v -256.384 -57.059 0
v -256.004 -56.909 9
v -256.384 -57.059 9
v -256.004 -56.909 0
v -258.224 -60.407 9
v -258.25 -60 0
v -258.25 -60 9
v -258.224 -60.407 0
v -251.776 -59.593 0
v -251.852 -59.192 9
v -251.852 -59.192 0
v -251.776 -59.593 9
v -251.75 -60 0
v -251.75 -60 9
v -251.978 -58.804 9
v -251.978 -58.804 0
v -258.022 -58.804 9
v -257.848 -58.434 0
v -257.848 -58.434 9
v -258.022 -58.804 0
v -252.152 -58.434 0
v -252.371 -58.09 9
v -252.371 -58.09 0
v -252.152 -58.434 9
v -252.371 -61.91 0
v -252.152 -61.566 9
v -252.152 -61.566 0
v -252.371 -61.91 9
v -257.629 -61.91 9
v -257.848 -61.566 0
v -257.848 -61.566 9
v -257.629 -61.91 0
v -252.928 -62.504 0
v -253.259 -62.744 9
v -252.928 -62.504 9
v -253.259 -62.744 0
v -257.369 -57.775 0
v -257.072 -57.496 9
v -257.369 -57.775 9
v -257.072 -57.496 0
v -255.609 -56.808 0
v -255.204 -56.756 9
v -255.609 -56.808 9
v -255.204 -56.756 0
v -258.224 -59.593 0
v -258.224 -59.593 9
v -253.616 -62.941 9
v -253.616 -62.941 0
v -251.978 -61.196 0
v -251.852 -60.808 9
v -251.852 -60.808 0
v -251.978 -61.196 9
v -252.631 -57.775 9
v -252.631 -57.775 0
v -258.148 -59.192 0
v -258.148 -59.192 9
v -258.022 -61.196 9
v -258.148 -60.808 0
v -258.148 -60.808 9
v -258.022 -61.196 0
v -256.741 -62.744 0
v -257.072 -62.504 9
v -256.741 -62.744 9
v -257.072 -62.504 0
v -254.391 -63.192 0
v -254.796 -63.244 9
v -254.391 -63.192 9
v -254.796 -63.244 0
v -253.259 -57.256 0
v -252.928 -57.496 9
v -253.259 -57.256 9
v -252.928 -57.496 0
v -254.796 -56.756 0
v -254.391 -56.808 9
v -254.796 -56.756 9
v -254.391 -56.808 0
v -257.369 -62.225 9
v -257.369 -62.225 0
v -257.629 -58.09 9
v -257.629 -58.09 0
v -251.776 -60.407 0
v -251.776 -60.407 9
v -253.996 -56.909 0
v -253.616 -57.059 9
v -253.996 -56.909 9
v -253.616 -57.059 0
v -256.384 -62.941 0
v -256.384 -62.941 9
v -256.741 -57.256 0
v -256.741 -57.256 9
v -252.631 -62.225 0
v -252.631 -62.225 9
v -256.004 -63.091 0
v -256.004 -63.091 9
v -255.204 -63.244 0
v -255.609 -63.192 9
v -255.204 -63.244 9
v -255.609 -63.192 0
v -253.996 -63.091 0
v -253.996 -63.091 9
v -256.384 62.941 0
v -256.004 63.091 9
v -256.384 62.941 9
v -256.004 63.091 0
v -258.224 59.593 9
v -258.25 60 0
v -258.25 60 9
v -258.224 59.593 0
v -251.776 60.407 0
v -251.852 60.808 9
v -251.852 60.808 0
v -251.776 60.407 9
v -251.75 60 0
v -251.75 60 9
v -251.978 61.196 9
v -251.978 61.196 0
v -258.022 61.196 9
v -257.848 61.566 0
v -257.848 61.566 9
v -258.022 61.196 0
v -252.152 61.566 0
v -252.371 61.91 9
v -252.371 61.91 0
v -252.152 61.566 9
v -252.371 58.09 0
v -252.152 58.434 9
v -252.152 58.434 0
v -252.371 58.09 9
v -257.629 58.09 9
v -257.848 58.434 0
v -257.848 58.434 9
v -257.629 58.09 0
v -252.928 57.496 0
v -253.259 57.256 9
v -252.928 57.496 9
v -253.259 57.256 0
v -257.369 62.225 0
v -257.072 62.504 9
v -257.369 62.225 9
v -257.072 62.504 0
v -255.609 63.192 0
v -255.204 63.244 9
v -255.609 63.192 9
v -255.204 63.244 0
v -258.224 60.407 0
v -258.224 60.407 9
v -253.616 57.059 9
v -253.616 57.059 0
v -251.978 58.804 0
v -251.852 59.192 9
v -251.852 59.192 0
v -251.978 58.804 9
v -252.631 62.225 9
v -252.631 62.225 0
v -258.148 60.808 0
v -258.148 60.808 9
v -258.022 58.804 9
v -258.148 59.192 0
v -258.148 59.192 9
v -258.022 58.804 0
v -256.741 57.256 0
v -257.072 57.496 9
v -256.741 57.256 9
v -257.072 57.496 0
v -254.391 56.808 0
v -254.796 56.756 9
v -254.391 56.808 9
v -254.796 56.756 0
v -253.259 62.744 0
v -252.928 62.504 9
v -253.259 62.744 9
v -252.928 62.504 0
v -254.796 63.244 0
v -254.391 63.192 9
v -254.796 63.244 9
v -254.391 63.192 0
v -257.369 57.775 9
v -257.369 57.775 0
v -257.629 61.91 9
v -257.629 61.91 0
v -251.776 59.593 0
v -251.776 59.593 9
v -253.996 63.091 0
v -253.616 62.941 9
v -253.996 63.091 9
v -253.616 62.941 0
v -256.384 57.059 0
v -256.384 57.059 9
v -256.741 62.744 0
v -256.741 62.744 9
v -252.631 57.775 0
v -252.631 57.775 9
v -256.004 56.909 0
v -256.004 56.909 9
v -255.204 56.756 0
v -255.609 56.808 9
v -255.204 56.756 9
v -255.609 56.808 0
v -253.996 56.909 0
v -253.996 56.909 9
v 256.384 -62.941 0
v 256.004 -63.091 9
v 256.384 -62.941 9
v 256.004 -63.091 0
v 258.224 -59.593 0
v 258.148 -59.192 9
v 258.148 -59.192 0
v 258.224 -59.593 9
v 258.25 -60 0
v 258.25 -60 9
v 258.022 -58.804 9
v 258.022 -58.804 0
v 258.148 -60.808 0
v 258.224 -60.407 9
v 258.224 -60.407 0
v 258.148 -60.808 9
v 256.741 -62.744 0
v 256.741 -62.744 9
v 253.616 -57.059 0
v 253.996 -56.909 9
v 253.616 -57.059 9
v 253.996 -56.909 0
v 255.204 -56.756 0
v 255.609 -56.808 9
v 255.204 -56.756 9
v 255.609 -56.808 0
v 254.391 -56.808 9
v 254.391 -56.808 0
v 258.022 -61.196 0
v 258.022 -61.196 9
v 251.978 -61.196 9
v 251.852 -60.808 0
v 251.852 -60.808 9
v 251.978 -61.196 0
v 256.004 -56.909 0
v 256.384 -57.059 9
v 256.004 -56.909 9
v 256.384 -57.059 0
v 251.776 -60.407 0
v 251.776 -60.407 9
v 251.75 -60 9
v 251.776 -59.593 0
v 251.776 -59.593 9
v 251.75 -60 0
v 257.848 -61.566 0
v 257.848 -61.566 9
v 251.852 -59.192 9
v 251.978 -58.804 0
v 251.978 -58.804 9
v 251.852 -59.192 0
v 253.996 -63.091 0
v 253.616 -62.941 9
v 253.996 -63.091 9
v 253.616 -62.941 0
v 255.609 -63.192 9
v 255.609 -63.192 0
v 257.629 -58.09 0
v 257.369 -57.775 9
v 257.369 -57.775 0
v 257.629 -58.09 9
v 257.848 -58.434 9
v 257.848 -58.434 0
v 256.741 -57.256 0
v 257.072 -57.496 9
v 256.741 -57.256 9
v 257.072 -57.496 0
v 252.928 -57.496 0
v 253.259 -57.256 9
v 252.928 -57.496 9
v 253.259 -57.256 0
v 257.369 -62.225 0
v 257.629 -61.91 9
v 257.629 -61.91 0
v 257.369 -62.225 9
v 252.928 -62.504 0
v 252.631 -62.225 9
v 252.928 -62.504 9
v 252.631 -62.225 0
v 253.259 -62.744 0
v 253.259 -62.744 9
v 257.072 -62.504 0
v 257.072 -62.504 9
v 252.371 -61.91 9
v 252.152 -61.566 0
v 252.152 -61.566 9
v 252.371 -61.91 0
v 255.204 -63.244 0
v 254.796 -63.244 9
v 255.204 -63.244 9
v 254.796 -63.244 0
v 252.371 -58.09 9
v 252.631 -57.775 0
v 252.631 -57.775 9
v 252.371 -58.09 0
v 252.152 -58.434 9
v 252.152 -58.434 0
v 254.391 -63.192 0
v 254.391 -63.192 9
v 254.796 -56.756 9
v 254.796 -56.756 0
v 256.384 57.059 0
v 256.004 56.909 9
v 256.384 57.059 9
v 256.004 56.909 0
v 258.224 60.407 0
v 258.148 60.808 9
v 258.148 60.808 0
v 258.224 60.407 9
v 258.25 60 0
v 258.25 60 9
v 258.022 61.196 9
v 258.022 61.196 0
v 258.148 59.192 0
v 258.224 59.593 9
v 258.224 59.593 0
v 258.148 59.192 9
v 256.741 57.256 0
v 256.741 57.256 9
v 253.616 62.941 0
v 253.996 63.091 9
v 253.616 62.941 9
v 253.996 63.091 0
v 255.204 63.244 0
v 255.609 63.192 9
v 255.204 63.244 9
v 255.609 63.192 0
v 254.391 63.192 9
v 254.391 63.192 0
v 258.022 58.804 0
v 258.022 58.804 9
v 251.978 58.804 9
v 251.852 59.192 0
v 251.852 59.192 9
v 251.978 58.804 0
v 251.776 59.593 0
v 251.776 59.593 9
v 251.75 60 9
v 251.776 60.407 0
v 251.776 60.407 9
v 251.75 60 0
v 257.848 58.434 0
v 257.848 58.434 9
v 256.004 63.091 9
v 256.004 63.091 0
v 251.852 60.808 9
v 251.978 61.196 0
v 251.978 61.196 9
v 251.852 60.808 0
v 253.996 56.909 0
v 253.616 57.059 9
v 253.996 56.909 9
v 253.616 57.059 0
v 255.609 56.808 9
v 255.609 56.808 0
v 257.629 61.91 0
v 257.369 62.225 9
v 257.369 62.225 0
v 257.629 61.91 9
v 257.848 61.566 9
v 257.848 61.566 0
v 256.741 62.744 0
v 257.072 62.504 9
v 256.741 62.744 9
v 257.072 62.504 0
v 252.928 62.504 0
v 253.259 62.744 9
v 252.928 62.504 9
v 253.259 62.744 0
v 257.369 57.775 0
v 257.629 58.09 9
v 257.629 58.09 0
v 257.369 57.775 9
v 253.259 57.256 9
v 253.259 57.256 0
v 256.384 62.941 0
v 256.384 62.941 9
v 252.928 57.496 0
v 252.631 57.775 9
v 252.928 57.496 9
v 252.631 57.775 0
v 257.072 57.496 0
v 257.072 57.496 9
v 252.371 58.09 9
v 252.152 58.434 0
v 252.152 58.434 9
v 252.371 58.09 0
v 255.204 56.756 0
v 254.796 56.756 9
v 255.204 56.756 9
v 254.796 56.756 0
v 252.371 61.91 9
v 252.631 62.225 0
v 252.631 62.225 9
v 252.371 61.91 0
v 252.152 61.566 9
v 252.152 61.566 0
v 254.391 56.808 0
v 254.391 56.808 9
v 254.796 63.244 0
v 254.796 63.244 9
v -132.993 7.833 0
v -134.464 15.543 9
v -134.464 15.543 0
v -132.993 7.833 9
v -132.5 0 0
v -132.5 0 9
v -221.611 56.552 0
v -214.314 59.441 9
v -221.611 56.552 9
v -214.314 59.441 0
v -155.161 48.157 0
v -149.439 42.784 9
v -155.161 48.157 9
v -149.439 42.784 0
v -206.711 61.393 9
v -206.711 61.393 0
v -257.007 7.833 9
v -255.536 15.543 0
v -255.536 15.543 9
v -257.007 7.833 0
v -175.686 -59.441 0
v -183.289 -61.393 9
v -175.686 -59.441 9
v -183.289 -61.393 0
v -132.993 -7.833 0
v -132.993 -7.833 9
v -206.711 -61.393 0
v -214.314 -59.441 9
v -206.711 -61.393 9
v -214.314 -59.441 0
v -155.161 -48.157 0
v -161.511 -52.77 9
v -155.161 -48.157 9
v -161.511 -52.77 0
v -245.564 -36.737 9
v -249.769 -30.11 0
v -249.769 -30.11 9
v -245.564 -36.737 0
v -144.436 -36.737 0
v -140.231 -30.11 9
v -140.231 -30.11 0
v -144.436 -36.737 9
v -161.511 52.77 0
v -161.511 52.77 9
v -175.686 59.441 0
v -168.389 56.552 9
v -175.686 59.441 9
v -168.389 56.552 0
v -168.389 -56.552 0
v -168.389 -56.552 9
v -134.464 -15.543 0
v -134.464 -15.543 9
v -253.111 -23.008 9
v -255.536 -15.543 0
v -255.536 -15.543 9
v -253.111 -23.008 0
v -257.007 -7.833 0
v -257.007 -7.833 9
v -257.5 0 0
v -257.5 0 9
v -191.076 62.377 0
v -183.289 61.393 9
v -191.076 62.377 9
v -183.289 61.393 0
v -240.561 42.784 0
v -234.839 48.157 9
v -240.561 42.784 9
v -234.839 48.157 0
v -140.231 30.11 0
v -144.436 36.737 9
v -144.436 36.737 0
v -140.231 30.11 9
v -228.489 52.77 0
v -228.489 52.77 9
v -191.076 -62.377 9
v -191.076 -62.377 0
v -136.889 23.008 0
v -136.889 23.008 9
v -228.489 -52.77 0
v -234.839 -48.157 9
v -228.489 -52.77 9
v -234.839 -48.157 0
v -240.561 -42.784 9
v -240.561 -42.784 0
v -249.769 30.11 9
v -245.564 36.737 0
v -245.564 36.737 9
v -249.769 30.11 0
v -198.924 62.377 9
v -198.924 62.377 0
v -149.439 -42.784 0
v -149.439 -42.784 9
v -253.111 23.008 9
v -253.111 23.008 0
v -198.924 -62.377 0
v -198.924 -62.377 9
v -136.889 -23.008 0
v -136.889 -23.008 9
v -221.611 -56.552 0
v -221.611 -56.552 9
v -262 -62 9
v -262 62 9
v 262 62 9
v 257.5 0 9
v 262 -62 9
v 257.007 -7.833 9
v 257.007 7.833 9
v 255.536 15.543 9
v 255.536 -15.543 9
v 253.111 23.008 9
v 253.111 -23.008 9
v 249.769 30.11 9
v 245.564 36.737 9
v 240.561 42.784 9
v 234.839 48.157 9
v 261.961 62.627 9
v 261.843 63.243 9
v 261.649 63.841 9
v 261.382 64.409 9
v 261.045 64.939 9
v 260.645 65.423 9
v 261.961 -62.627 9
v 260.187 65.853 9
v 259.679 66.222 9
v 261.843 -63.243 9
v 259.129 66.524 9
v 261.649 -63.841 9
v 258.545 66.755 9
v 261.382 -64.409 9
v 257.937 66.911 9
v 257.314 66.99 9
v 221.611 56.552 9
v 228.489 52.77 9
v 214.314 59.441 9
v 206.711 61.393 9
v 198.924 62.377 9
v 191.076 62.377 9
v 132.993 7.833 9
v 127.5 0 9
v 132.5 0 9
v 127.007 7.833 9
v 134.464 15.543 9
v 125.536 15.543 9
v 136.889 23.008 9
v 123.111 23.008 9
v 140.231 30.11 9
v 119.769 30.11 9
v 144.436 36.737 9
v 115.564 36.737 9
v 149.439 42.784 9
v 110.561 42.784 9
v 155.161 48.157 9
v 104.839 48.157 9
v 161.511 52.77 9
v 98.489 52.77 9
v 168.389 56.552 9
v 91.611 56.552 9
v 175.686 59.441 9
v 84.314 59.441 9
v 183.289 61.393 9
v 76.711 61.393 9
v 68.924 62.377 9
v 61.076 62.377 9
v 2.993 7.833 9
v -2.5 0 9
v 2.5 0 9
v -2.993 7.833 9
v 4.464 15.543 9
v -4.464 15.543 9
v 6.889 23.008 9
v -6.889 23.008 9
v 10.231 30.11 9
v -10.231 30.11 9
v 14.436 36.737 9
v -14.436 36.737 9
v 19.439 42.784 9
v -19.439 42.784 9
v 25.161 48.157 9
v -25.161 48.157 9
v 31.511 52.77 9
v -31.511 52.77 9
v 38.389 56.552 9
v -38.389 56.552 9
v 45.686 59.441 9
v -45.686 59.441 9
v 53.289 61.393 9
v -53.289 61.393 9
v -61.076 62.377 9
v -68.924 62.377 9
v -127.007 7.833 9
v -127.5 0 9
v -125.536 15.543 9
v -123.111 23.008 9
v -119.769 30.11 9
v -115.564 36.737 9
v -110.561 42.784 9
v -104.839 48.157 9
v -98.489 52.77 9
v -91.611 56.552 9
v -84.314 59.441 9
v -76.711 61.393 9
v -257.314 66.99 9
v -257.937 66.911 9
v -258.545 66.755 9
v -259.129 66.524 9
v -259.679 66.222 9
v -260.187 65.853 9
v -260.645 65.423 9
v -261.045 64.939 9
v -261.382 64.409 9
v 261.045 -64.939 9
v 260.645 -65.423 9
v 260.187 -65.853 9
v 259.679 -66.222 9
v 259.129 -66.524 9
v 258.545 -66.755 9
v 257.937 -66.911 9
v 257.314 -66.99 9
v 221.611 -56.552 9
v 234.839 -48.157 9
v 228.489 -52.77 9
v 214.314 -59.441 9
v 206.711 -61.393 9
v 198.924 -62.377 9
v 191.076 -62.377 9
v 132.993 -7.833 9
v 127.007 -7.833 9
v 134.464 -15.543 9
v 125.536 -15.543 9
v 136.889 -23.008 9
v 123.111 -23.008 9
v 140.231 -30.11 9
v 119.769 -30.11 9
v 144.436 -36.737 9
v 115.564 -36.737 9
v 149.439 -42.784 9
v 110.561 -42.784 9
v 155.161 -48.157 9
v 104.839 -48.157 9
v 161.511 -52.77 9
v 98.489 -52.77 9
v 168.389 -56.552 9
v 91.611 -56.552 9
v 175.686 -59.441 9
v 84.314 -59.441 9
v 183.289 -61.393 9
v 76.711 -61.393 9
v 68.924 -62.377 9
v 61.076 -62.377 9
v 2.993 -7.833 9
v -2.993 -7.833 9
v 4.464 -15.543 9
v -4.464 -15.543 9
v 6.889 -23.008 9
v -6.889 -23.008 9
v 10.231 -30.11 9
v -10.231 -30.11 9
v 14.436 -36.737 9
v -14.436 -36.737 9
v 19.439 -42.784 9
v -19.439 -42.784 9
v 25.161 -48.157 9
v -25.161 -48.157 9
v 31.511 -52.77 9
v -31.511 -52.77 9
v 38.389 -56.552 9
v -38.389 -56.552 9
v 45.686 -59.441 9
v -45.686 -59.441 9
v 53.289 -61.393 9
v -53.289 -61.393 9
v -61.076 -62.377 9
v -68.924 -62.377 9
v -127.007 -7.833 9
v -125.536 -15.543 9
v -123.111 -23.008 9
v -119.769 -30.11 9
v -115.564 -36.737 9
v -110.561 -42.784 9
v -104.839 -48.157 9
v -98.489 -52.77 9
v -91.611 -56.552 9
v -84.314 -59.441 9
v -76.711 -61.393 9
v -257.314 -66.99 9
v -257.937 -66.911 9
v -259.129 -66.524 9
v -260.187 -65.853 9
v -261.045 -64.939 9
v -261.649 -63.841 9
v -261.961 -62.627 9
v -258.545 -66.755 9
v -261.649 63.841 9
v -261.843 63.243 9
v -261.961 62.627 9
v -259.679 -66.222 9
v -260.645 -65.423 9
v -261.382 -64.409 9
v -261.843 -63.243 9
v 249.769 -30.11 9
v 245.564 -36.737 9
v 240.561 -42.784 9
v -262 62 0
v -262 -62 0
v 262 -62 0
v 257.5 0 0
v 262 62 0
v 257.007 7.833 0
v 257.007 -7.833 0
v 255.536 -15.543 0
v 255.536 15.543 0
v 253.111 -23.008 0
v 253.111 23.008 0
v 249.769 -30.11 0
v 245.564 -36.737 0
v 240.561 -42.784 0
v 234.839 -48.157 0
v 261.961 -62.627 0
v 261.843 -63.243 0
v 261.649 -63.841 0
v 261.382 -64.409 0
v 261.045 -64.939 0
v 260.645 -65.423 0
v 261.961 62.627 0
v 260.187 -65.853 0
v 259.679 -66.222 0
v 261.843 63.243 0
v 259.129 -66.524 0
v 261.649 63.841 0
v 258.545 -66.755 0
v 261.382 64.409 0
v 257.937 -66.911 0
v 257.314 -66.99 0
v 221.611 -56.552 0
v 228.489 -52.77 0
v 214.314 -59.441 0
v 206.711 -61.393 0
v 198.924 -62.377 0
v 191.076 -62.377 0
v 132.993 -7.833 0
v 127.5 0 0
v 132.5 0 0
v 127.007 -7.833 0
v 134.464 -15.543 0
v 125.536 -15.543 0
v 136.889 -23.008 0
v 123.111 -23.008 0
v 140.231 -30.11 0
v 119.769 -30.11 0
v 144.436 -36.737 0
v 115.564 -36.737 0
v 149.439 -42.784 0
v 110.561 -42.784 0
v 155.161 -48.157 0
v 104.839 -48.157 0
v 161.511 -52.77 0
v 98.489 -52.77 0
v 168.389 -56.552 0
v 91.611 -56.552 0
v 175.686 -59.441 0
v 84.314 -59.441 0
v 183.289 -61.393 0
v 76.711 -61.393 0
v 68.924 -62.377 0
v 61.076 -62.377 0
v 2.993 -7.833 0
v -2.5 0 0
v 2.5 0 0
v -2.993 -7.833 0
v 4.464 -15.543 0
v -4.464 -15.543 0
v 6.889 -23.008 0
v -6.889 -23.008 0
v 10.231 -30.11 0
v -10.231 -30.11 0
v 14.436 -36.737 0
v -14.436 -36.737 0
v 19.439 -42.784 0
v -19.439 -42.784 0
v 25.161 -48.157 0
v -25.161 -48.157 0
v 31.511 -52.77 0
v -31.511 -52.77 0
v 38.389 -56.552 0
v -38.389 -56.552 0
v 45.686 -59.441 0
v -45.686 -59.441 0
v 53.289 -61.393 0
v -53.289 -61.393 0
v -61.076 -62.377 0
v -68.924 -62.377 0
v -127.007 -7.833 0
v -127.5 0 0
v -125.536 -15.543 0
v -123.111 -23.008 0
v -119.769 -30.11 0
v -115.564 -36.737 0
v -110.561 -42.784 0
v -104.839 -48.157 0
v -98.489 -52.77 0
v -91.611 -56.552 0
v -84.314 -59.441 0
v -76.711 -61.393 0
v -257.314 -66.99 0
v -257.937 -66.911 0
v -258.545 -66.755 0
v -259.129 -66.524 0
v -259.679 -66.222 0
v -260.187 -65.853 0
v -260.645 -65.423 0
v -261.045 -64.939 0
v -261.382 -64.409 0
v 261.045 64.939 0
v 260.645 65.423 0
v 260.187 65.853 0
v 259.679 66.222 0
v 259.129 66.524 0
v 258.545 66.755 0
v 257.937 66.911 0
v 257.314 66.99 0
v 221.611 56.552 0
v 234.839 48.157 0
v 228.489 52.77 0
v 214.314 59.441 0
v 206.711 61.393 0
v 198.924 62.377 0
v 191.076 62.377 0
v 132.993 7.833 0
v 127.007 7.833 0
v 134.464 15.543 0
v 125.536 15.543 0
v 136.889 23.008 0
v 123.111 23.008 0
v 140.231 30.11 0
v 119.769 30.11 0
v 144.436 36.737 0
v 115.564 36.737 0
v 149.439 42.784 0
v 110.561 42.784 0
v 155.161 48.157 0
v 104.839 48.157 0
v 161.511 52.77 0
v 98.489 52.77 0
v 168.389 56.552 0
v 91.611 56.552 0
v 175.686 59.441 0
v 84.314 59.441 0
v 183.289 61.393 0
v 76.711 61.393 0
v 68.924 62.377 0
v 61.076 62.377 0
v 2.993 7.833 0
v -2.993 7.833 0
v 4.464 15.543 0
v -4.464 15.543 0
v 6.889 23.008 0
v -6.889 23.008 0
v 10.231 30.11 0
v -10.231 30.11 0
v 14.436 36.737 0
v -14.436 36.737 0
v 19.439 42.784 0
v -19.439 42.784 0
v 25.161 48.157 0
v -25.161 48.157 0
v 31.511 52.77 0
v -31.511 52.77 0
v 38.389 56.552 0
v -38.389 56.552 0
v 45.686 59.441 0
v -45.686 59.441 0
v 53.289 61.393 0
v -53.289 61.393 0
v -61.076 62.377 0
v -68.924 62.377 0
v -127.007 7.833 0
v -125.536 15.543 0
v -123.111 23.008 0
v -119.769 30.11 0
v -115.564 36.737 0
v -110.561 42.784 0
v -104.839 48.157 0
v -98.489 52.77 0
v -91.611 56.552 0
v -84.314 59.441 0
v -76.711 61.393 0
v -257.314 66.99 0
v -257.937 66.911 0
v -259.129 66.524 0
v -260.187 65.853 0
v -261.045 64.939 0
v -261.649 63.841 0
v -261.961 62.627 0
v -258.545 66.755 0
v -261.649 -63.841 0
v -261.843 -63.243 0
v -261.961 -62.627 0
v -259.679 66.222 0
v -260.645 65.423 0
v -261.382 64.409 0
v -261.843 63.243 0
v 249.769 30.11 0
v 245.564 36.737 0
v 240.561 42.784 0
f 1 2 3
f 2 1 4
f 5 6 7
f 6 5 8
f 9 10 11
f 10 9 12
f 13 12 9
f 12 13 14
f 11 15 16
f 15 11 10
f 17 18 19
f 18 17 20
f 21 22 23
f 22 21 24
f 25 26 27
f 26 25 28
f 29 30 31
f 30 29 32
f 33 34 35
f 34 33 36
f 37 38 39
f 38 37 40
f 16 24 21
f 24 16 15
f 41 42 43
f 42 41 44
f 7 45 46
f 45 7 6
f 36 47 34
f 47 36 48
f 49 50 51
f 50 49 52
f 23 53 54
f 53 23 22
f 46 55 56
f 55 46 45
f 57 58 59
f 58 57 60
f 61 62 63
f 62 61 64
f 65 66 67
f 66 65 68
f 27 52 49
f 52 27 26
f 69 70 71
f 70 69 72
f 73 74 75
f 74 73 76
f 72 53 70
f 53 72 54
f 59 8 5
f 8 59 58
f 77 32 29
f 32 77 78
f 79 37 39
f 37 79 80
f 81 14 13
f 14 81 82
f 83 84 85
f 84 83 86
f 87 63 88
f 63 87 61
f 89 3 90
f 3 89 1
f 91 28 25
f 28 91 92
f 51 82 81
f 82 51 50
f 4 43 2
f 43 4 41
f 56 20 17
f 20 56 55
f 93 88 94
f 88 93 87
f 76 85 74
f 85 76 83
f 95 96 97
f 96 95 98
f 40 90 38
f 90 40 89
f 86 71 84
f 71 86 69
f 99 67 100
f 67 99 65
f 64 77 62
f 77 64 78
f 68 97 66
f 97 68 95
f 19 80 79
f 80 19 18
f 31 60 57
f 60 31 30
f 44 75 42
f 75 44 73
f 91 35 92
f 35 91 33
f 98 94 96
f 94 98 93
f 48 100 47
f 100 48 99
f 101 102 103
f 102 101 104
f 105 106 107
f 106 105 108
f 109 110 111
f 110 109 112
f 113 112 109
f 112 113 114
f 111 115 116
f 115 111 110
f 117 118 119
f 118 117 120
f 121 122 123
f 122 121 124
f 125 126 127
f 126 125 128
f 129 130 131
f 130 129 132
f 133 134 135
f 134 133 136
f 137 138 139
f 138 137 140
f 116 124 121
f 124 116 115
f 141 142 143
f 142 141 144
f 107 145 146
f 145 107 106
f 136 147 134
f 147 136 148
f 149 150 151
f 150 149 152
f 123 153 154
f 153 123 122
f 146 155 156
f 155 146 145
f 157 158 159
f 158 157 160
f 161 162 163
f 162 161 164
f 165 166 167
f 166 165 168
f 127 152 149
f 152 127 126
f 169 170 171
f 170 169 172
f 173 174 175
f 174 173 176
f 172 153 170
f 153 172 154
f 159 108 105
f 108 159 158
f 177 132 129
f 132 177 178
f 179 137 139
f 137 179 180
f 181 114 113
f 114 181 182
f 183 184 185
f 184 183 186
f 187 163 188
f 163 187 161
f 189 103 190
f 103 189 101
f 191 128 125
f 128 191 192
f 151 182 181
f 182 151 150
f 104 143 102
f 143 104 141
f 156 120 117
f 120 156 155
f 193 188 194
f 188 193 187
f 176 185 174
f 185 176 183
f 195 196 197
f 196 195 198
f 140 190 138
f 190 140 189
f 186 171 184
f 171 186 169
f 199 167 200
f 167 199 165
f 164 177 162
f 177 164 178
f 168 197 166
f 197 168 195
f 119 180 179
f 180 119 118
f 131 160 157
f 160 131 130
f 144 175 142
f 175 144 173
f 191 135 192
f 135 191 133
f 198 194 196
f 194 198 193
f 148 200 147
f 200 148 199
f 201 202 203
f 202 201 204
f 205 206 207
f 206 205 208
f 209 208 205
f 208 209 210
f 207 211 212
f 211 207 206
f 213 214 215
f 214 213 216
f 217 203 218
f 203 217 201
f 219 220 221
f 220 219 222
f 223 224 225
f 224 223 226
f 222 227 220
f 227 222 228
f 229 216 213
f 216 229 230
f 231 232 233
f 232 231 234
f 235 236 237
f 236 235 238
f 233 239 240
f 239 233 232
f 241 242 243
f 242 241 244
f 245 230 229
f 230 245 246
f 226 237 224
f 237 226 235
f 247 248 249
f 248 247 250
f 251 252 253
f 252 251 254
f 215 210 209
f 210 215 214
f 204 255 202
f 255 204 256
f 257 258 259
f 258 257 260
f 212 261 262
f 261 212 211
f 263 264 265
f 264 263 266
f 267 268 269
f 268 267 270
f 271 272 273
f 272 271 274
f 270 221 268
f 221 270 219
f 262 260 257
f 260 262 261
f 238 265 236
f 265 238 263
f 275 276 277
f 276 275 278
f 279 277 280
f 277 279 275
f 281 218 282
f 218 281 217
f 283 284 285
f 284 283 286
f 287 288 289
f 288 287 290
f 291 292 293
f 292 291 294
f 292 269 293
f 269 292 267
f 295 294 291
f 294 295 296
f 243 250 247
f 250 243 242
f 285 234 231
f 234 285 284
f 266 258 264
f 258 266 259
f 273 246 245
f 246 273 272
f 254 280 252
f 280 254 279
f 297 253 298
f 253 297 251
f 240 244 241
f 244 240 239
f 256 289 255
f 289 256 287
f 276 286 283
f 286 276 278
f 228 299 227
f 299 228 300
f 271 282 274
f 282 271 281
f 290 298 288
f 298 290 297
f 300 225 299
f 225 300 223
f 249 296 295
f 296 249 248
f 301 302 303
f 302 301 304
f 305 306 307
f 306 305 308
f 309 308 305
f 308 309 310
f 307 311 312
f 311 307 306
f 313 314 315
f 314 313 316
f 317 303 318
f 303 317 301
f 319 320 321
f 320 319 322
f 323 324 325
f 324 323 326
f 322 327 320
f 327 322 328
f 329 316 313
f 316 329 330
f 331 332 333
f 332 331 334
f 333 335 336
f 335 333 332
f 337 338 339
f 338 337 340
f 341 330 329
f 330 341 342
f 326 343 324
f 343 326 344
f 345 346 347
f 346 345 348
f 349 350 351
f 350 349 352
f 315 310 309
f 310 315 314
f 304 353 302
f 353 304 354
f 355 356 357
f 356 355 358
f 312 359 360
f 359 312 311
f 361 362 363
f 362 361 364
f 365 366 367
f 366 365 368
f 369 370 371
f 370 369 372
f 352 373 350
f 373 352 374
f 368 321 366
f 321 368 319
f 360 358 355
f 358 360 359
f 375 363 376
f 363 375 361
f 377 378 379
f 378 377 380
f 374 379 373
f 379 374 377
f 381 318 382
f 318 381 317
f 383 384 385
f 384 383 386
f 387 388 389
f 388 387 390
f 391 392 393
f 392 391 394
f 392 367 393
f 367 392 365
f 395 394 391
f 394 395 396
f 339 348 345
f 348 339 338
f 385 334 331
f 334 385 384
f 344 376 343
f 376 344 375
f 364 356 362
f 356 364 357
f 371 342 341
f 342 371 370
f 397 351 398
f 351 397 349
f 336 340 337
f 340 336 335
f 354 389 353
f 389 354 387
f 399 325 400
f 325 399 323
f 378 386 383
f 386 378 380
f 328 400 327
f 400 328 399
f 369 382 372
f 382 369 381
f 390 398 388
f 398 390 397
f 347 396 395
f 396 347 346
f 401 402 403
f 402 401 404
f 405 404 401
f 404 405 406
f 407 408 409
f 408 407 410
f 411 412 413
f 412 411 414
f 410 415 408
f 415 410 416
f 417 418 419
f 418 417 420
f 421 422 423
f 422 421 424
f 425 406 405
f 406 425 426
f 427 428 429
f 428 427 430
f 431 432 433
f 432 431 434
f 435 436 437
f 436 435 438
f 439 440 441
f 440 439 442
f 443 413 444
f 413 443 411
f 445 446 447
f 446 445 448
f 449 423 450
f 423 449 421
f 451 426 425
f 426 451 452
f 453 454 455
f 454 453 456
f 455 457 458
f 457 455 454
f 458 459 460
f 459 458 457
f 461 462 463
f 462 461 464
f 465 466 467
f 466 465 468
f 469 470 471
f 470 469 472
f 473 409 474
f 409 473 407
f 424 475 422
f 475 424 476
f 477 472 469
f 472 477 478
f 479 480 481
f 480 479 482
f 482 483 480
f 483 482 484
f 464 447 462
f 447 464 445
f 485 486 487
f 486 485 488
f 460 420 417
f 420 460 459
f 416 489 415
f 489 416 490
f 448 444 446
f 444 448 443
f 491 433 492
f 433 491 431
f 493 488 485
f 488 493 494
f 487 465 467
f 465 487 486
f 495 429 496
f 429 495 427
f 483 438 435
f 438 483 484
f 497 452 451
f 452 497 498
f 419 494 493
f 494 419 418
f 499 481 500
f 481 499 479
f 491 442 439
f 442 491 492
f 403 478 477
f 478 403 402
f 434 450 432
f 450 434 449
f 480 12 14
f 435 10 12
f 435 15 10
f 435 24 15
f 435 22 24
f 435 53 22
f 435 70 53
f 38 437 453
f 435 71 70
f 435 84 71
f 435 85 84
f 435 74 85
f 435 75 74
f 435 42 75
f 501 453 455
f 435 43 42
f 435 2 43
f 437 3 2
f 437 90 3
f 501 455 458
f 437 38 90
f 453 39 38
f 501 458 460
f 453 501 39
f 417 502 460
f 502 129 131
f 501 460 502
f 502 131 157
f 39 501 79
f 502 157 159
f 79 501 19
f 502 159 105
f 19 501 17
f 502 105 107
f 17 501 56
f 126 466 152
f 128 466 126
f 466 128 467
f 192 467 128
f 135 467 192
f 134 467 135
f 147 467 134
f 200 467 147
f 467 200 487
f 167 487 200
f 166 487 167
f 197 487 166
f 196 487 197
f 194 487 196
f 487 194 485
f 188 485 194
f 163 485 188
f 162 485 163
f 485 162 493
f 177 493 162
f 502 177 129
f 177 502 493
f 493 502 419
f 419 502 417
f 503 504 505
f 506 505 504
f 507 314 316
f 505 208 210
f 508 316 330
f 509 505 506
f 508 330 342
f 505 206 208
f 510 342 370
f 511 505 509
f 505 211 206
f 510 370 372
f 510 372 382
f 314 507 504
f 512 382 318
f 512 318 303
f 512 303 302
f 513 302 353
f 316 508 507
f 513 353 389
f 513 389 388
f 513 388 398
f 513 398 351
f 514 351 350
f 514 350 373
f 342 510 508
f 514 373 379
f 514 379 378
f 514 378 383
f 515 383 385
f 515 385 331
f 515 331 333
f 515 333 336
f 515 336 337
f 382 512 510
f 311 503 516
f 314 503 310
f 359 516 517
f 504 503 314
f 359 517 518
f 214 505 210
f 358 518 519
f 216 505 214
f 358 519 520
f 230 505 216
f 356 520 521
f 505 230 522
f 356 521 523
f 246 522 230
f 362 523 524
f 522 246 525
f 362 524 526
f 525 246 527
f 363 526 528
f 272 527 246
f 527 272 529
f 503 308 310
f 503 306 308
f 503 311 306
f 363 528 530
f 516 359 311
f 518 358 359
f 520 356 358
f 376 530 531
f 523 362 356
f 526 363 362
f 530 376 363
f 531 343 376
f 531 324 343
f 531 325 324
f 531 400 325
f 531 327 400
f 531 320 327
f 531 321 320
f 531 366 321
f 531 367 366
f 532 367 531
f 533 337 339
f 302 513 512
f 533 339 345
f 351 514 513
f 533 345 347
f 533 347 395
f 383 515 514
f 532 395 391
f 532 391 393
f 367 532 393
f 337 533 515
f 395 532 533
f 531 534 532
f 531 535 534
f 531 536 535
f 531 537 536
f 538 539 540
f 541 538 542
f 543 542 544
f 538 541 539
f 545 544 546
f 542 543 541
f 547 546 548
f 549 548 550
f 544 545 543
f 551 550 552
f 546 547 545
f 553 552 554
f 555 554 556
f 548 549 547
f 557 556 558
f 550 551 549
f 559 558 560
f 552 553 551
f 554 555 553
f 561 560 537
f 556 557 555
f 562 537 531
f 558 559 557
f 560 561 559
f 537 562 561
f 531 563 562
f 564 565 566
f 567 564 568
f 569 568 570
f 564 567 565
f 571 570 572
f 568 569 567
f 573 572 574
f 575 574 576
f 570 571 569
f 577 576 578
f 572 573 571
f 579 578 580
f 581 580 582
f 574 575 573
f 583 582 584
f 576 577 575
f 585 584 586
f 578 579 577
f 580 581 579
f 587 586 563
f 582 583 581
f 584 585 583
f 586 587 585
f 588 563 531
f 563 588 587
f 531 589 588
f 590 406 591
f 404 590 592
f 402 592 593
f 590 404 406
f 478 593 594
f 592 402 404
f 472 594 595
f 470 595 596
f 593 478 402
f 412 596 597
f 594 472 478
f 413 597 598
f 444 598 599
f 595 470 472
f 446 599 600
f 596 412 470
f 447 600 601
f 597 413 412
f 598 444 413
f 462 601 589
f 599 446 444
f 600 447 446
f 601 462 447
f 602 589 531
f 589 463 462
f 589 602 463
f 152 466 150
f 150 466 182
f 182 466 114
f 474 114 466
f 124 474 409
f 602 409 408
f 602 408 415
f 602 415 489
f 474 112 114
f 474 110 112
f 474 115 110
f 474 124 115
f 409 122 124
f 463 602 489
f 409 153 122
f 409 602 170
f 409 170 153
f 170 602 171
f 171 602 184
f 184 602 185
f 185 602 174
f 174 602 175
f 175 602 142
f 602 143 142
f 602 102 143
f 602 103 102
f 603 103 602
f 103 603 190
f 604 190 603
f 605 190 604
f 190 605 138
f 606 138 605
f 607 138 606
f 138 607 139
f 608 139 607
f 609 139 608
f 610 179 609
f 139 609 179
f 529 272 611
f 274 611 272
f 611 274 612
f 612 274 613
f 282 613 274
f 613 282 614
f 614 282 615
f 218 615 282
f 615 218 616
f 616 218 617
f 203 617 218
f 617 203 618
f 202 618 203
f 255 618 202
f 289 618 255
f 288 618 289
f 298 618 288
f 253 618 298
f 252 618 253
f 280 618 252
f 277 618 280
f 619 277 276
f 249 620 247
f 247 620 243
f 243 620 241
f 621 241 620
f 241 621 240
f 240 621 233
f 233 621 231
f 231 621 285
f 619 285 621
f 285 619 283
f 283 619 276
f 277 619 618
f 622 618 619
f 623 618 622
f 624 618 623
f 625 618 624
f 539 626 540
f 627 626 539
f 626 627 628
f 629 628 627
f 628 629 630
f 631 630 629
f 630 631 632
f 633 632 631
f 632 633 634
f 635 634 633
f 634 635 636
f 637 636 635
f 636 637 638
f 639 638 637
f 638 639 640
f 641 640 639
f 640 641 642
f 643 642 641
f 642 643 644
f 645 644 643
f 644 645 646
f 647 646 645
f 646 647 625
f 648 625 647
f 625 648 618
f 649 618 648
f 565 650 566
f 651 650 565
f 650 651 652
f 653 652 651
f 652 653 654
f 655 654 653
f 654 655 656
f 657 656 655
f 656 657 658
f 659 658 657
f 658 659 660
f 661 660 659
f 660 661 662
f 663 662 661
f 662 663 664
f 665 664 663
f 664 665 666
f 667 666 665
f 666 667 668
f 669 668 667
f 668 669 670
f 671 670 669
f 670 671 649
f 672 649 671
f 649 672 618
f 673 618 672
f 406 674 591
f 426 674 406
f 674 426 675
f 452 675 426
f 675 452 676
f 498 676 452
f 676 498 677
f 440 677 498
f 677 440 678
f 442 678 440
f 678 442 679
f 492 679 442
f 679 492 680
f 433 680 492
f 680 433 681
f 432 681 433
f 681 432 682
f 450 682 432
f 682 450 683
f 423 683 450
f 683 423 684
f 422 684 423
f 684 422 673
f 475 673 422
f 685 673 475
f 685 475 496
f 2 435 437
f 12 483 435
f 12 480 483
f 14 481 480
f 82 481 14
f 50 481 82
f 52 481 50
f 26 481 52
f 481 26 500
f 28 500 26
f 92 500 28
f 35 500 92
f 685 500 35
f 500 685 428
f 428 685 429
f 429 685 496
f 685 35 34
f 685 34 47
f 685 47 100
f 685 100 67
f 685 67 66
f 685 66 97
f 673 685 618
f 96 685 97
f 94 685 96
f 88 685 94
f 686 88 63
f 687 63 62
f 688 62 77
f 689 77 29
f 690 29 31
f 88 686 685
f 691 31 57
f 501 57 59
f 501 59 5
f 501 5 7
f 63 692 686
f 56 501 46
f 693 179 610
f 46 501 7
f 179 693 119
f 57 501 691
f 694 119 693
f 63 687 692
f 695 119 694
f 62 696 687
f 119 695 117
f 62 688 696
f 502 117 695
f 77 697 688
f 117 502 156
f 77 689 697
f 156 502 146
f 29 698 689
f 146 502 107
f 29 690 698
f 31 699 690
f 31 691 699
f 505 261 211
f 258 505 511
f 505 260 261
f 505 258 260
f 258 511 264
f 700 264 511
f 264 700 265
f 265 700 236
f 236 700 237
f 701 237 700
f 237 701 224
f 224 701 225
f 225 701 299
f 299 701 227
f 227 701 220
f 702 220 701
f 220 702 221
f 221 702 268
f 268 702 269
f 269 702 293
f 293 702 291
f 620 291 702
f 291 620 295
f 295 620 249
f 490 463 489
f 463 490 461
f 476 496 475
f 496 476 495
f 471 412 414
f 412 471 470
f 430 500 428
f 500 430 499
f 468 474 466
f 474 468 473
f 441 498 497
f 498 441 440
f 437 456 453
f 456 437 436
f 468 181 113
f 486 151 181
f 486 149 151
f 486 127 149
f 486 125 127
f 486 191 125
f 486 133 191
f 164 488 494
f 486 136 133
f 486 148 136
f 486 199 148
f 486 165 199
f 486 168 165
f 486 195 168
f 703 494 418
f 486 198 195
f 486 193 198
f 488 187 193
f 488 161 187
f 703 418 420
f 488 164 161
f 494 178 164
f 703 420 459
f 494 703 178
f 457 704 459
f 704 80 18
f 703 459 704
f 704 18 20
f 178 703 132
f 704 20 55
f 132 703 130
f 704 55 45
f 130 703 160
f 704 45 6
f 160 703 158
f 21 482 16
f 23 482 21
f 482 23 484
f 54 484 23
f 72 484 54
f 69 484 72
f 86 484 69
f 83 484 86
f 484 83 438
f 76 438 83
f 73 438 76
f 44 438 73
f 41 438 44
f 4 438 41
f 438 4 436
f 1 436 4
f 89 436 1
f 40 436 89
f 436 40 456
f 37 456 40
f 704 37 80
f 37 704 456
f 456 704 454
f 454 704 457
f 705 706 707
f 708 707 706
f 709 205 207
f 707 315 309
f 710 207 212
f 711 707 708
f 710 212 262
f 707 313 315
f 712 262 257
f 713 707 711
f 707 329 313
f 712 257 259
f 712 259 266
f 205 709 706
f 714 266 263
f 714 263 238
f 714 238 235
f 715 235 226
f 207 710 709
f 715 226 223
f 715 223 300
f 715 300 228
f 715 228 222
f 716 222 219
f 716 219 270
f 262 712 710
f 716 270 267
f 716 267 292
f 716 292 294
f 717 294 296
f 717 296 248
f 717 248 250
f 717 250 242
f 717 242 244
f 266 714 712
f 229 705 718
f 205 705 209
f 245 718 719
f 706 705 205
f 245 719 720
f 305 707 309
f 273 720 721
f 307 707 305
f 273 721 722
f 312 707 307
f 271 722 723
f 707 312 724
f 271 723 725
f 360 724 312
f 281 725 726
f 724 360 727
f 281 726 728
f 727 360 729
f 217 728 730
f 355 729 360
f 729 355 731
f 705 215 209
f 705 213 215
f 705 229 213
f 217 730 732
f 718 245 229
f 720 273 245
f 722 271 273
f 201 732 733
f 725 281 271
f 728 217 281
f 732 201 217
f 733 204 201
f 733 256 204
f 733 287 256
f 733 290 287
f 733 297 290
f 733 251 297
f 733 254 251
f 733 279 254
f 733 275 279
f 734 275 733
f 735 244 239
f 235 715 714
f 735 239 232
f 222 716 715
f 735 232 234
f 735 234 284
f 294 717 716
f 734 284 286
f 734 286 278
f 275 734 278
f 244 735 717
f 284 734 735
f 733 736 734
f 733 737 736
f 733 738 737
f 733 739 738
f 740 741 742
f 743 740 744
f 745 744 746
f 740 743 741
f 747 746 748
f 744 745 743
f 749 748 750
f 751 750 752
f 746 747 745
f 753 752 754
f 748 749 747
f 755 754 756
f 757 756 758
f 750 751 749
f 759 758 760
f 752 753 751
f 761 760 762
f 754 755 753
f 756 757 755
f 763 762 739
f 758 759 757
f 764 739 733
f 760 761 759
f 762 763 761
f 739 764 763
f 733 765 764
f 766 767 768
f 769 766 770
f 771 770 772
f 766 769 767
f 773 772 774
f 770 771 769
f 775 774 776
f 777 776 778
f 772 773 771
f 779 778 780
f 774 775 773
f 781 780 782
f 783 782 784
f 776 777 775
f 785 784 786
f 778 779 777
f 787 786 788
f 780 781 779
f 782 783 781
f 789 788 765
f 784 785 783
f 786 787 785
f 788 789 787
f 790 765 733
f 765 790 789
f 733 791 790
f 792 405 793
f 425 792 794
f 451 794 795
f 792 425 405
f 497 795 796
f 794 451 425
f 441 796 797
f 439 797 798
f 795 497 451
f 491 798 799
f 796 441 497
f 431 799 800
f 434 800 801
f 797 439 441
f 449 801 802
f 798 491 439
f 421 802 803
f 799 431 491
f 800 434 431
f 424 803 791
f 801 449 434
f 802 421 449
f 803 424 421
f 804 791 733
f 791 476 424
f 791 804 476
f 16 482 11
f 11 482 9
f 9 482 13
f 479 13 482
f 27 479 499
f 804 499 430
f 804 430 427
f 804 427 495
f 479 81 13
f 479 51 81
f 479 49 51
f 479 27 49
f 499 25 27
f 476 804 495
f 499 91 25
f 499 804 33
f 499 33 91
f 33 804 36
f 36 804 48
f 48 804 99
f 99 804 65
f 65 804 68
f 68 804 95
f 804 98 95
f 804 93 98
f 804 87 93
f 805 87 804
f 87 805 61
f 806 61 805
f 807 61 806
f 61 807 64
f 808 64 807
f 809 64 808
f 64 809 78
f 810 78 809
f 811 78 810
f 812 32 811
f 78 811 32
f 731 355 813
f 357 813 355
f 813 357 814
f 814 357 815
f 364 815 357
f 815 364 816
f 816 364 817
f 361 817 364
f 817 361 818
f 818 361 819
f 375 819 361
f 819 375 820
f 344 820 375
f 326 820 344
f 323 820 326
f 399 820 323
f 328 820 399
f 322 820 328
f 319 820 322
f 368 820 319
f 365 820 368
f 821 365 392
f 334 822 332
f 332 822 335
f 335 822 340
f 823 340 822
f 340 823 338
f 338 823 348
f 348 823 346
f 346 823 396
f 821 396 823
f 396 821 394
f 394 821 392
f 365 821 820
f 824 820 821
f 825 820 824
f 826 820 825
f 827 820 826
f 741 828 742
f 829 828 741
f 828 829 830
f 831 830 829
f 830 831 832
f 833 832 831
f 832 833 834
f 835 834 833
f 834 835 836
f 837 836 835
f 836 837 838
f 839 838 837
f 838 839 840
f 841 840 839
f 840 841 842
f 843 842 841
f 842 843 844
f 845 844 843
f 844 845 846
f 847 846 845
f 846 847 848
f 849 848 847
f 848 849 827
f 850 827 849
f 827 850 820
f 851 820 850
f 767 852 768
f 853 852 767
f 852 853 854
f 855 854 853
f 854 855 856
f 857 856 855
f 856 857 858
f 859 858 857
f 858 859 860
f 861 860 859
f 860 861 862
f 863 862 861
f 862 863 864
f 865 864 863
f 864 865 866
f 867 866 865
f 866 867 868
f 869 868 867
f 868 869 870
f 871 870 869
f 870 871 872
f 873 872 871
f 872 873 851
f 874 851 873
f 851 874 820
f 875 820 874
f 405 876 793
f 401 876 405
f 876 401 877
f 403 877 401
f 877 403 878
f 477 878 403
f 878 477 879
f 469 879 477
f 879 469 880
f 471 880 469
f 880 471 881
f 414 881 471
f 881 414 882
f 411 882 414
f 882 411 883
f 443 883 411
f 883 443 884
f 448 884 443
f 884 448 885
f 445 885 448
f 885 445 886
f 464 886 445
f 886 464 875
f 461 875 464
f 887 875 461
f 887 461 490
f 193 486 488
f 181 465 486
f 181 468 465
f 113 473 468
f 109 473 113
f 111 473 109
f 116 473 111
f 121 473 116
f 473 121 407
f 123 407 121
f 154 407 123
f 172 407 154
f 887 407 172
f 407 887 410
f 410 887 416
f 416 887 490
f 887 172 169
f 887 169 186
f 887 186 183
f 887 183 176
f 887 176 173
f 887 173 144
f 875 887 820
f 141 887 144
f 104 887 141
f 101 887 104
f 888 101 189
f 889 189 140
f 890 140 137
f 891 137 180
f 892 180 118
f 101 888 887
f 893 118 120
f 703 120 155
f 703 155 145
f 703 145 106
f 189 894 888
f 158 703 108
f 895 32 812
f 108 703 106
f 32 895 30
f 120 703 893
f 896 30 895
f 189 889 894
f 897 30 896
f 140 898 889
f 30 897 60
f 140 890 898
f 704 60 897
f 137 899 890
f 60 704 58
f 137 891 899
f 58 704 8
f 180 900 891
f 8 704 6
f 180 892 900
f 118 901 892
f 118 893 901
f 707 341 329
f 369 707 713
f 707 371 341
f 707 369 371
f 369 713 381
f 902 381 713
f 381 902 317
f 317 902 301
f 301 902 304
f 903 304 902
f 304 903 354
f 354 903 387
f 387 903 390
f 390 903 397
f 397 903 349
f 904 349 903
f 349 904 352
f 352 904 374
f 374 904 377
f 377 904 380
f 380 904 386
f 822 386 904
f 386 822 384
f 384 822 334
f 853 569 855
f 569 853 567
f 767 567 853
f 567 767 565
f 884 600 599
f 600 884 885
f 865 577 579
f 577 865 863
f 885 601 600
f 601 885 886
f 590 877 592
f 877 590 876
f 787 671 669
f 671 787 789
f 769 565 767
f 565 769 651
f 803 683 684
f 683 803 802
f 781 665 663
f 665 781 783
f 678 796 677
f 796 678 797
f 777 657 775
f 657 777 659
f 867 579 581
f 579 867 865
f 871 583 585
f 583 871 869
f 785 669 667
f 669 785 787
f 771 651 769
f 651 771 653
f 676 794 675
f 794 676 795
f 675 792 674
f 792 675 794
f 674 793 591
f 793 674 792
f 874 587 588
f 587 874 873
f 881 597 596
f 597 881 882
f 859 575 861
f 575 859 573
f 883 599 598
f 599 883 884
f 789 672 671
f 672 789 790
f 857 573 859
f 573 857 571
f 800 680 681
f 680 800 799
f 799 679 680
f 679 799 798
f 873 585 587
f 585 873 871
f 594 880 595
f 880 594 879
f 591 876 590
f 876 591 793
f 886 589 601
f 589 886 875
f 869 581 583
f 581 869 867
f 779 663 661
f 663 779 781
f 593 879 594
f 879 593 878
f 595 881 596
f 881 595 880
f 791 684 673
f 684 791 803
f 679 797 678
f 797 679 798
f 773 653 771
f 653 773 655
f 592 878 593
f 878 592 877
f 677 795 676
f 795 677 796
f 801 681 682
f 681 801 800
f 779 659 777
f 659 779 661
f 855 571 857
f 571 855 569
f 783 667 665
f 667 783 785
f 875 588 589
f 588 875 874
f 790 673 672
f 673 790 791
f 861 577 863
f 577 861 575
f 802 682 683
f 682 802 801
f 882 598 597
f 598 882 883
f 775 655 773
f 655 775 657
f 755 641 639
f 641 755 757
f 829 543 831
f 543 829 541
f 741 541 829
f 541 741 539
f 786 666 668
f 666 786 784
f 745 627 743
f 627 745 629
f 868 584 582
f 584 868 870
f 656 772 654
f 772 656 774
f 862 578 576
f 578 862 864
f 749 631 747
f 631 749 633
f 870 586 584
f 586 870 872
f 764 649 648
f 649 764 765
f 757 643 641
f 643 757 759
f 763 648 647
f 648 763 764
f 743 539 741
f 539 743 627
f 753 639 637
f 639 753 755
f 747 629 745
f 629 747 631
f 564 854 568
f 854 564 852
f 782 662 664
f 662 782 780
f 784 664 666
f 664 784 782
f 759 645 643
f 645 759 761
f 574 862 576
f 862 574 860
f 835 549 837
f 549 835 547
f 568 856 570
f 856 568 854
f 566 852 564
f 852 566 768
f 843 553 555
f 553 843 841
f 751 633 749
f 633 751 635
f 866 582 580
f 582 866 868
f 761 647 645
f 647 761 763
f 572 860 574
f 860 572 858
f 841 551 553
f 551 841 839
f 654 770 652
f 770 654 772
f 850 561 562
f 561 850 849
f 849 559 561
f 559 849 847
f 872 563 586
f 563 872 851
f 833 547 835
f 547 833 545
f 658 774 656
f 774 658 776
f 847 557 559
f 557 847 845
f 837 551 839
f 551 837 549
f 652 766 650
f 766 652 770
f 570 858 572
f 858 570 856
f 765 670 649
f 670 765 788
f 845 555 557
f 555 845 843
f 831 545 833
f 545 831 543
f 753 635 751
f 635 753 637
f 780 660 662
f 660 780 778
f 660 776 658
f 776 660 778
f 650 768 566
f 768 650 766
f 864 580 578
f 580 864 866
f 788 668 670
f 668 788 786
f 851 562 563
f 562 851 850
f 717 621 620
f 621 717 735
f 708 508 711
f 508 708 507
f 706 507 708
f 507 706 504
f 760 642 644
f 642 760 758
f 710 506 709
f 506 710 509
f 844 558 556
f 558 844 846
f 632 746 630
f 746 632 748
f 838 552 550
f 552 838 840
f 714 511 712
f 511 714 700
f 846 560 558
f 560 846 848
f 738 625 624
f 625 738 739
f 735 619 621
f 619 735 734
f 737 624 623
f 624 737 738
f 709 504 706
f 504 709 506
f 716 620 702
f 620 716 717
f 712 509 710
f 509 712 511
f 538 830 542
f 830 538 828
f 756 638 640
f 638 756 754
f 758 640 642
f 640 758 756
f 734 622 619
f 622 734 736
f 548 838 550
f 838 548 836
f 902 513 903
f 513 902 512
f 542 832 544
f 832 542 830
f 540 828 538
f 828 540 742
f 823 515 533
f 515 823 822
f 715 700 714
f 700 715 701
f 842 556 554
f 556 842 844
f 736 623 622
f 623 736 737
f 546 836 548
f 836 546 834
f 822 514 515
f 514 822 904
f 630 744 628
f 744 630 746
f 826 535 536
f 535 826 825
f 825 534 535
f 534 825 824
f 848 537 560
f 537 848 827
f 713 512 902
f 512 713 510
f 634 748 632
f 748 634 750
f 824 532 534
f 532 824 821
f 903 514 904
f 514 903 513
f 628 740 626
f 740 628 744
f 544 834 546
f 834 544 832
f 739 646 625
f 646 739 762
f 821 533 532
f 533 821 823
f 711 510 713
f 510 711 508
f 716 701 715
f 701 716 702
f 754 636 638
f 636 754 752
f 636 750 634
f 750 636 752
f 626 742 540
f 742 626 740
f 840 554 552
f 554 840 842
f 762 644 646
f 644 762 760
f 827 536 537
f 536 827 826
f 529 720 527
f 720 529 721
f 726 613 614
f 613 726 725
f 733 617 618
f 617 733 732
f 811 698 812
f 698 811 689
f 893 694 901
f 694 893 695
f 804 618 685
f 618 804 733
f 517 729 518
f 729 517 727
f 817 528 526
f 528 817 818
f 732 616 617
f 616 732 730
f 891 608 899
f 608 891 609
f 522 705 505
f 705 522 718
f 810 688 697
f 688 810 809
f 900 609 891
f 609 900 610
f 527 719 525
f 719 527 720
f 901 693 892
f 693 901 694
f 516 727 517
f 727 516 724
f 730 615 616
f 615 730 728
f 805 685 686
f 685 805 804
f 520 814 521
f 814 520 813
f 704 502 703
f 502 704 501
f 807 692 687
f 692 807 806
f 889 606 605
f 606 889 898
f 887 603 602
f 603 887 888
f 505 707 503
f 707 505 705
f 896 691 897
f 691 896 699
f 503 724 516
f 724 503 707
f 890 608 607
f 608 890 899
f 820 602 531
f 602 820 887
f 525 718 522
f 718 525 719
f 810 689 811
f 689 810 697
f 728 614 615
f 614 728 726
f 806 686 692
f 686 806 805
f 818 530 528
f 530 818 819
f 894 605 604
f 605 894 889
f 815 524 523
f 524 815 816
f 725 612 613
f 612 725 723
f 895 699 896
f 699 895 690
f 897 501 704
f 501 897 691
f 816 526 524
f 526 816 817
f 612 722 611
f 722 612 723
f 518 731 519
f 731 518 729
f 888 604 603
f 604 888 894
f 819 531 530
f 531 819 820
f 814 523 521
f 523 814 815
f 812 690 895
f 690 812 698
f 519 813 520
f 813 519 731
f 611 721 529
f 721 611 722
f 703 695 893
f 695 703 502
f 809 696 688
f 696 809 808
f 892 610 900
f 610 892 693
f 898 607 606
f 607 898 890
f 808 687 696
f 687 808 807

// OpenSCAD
$fn = 50;


difference() {
	union() {
		hull() {
			translate(v = [-257.0000000000, 62.0000000000, 0]) {
				cylinder(h = 9, r = 5);
			}
			translate(v = [257.0000000000, 62.0000000000, 0]) {
				cylinder(h = 9, r = 5);
			}
			translate(v = [-257.0000000000, -62.0000000000, 0]) {
				cylinder(h = 9, r = 5);
			}
			translate(v = [257.0000000000, -62.0000000000, 0]) {
				cylinder(h = 9, r = 5);
			}
		}
	}
	union() {
		#translate(v = [-255.0000000000, -60.0000000000, -100.0000000000]) {
			cylinder(h = 200, r = 3.2500000000);
		}
		#translate(v = [-255.0000000000, 60.0000000000, -100.0000000000]) {
			cylinder(h = 200, r = 3.2500000000);
		}
		#translate(v = [255.0000000000, -60.0000000000, -100.0000000000]) {
			cylinder(h = 200, r = 3.2500000000);
		}
		#translate(v = [255.0000000000, 60.0000000000, -100.0000000000]) {
			cylinder(h = 200, r = 3.2500000000);
		}
		#translate(v = [-195.0000000000, 0, 0]) {
			cylinder(h = 9, r = 62.5000000000);
		}
		#translate(v = [-65.0000000000, 0, 0]) {
			cylinder(h = 9, r = 62.5000000000);
		}
		#translate(v = [65.0000000000, 0, 0]) {
			cylinder(h = 9, r = 62.5000000000);
		}
		#translate(v = [195.0000000000, 0, 0]) {
			cylinder(h = 9, r = 62.5000000000);
		}
	}
}
